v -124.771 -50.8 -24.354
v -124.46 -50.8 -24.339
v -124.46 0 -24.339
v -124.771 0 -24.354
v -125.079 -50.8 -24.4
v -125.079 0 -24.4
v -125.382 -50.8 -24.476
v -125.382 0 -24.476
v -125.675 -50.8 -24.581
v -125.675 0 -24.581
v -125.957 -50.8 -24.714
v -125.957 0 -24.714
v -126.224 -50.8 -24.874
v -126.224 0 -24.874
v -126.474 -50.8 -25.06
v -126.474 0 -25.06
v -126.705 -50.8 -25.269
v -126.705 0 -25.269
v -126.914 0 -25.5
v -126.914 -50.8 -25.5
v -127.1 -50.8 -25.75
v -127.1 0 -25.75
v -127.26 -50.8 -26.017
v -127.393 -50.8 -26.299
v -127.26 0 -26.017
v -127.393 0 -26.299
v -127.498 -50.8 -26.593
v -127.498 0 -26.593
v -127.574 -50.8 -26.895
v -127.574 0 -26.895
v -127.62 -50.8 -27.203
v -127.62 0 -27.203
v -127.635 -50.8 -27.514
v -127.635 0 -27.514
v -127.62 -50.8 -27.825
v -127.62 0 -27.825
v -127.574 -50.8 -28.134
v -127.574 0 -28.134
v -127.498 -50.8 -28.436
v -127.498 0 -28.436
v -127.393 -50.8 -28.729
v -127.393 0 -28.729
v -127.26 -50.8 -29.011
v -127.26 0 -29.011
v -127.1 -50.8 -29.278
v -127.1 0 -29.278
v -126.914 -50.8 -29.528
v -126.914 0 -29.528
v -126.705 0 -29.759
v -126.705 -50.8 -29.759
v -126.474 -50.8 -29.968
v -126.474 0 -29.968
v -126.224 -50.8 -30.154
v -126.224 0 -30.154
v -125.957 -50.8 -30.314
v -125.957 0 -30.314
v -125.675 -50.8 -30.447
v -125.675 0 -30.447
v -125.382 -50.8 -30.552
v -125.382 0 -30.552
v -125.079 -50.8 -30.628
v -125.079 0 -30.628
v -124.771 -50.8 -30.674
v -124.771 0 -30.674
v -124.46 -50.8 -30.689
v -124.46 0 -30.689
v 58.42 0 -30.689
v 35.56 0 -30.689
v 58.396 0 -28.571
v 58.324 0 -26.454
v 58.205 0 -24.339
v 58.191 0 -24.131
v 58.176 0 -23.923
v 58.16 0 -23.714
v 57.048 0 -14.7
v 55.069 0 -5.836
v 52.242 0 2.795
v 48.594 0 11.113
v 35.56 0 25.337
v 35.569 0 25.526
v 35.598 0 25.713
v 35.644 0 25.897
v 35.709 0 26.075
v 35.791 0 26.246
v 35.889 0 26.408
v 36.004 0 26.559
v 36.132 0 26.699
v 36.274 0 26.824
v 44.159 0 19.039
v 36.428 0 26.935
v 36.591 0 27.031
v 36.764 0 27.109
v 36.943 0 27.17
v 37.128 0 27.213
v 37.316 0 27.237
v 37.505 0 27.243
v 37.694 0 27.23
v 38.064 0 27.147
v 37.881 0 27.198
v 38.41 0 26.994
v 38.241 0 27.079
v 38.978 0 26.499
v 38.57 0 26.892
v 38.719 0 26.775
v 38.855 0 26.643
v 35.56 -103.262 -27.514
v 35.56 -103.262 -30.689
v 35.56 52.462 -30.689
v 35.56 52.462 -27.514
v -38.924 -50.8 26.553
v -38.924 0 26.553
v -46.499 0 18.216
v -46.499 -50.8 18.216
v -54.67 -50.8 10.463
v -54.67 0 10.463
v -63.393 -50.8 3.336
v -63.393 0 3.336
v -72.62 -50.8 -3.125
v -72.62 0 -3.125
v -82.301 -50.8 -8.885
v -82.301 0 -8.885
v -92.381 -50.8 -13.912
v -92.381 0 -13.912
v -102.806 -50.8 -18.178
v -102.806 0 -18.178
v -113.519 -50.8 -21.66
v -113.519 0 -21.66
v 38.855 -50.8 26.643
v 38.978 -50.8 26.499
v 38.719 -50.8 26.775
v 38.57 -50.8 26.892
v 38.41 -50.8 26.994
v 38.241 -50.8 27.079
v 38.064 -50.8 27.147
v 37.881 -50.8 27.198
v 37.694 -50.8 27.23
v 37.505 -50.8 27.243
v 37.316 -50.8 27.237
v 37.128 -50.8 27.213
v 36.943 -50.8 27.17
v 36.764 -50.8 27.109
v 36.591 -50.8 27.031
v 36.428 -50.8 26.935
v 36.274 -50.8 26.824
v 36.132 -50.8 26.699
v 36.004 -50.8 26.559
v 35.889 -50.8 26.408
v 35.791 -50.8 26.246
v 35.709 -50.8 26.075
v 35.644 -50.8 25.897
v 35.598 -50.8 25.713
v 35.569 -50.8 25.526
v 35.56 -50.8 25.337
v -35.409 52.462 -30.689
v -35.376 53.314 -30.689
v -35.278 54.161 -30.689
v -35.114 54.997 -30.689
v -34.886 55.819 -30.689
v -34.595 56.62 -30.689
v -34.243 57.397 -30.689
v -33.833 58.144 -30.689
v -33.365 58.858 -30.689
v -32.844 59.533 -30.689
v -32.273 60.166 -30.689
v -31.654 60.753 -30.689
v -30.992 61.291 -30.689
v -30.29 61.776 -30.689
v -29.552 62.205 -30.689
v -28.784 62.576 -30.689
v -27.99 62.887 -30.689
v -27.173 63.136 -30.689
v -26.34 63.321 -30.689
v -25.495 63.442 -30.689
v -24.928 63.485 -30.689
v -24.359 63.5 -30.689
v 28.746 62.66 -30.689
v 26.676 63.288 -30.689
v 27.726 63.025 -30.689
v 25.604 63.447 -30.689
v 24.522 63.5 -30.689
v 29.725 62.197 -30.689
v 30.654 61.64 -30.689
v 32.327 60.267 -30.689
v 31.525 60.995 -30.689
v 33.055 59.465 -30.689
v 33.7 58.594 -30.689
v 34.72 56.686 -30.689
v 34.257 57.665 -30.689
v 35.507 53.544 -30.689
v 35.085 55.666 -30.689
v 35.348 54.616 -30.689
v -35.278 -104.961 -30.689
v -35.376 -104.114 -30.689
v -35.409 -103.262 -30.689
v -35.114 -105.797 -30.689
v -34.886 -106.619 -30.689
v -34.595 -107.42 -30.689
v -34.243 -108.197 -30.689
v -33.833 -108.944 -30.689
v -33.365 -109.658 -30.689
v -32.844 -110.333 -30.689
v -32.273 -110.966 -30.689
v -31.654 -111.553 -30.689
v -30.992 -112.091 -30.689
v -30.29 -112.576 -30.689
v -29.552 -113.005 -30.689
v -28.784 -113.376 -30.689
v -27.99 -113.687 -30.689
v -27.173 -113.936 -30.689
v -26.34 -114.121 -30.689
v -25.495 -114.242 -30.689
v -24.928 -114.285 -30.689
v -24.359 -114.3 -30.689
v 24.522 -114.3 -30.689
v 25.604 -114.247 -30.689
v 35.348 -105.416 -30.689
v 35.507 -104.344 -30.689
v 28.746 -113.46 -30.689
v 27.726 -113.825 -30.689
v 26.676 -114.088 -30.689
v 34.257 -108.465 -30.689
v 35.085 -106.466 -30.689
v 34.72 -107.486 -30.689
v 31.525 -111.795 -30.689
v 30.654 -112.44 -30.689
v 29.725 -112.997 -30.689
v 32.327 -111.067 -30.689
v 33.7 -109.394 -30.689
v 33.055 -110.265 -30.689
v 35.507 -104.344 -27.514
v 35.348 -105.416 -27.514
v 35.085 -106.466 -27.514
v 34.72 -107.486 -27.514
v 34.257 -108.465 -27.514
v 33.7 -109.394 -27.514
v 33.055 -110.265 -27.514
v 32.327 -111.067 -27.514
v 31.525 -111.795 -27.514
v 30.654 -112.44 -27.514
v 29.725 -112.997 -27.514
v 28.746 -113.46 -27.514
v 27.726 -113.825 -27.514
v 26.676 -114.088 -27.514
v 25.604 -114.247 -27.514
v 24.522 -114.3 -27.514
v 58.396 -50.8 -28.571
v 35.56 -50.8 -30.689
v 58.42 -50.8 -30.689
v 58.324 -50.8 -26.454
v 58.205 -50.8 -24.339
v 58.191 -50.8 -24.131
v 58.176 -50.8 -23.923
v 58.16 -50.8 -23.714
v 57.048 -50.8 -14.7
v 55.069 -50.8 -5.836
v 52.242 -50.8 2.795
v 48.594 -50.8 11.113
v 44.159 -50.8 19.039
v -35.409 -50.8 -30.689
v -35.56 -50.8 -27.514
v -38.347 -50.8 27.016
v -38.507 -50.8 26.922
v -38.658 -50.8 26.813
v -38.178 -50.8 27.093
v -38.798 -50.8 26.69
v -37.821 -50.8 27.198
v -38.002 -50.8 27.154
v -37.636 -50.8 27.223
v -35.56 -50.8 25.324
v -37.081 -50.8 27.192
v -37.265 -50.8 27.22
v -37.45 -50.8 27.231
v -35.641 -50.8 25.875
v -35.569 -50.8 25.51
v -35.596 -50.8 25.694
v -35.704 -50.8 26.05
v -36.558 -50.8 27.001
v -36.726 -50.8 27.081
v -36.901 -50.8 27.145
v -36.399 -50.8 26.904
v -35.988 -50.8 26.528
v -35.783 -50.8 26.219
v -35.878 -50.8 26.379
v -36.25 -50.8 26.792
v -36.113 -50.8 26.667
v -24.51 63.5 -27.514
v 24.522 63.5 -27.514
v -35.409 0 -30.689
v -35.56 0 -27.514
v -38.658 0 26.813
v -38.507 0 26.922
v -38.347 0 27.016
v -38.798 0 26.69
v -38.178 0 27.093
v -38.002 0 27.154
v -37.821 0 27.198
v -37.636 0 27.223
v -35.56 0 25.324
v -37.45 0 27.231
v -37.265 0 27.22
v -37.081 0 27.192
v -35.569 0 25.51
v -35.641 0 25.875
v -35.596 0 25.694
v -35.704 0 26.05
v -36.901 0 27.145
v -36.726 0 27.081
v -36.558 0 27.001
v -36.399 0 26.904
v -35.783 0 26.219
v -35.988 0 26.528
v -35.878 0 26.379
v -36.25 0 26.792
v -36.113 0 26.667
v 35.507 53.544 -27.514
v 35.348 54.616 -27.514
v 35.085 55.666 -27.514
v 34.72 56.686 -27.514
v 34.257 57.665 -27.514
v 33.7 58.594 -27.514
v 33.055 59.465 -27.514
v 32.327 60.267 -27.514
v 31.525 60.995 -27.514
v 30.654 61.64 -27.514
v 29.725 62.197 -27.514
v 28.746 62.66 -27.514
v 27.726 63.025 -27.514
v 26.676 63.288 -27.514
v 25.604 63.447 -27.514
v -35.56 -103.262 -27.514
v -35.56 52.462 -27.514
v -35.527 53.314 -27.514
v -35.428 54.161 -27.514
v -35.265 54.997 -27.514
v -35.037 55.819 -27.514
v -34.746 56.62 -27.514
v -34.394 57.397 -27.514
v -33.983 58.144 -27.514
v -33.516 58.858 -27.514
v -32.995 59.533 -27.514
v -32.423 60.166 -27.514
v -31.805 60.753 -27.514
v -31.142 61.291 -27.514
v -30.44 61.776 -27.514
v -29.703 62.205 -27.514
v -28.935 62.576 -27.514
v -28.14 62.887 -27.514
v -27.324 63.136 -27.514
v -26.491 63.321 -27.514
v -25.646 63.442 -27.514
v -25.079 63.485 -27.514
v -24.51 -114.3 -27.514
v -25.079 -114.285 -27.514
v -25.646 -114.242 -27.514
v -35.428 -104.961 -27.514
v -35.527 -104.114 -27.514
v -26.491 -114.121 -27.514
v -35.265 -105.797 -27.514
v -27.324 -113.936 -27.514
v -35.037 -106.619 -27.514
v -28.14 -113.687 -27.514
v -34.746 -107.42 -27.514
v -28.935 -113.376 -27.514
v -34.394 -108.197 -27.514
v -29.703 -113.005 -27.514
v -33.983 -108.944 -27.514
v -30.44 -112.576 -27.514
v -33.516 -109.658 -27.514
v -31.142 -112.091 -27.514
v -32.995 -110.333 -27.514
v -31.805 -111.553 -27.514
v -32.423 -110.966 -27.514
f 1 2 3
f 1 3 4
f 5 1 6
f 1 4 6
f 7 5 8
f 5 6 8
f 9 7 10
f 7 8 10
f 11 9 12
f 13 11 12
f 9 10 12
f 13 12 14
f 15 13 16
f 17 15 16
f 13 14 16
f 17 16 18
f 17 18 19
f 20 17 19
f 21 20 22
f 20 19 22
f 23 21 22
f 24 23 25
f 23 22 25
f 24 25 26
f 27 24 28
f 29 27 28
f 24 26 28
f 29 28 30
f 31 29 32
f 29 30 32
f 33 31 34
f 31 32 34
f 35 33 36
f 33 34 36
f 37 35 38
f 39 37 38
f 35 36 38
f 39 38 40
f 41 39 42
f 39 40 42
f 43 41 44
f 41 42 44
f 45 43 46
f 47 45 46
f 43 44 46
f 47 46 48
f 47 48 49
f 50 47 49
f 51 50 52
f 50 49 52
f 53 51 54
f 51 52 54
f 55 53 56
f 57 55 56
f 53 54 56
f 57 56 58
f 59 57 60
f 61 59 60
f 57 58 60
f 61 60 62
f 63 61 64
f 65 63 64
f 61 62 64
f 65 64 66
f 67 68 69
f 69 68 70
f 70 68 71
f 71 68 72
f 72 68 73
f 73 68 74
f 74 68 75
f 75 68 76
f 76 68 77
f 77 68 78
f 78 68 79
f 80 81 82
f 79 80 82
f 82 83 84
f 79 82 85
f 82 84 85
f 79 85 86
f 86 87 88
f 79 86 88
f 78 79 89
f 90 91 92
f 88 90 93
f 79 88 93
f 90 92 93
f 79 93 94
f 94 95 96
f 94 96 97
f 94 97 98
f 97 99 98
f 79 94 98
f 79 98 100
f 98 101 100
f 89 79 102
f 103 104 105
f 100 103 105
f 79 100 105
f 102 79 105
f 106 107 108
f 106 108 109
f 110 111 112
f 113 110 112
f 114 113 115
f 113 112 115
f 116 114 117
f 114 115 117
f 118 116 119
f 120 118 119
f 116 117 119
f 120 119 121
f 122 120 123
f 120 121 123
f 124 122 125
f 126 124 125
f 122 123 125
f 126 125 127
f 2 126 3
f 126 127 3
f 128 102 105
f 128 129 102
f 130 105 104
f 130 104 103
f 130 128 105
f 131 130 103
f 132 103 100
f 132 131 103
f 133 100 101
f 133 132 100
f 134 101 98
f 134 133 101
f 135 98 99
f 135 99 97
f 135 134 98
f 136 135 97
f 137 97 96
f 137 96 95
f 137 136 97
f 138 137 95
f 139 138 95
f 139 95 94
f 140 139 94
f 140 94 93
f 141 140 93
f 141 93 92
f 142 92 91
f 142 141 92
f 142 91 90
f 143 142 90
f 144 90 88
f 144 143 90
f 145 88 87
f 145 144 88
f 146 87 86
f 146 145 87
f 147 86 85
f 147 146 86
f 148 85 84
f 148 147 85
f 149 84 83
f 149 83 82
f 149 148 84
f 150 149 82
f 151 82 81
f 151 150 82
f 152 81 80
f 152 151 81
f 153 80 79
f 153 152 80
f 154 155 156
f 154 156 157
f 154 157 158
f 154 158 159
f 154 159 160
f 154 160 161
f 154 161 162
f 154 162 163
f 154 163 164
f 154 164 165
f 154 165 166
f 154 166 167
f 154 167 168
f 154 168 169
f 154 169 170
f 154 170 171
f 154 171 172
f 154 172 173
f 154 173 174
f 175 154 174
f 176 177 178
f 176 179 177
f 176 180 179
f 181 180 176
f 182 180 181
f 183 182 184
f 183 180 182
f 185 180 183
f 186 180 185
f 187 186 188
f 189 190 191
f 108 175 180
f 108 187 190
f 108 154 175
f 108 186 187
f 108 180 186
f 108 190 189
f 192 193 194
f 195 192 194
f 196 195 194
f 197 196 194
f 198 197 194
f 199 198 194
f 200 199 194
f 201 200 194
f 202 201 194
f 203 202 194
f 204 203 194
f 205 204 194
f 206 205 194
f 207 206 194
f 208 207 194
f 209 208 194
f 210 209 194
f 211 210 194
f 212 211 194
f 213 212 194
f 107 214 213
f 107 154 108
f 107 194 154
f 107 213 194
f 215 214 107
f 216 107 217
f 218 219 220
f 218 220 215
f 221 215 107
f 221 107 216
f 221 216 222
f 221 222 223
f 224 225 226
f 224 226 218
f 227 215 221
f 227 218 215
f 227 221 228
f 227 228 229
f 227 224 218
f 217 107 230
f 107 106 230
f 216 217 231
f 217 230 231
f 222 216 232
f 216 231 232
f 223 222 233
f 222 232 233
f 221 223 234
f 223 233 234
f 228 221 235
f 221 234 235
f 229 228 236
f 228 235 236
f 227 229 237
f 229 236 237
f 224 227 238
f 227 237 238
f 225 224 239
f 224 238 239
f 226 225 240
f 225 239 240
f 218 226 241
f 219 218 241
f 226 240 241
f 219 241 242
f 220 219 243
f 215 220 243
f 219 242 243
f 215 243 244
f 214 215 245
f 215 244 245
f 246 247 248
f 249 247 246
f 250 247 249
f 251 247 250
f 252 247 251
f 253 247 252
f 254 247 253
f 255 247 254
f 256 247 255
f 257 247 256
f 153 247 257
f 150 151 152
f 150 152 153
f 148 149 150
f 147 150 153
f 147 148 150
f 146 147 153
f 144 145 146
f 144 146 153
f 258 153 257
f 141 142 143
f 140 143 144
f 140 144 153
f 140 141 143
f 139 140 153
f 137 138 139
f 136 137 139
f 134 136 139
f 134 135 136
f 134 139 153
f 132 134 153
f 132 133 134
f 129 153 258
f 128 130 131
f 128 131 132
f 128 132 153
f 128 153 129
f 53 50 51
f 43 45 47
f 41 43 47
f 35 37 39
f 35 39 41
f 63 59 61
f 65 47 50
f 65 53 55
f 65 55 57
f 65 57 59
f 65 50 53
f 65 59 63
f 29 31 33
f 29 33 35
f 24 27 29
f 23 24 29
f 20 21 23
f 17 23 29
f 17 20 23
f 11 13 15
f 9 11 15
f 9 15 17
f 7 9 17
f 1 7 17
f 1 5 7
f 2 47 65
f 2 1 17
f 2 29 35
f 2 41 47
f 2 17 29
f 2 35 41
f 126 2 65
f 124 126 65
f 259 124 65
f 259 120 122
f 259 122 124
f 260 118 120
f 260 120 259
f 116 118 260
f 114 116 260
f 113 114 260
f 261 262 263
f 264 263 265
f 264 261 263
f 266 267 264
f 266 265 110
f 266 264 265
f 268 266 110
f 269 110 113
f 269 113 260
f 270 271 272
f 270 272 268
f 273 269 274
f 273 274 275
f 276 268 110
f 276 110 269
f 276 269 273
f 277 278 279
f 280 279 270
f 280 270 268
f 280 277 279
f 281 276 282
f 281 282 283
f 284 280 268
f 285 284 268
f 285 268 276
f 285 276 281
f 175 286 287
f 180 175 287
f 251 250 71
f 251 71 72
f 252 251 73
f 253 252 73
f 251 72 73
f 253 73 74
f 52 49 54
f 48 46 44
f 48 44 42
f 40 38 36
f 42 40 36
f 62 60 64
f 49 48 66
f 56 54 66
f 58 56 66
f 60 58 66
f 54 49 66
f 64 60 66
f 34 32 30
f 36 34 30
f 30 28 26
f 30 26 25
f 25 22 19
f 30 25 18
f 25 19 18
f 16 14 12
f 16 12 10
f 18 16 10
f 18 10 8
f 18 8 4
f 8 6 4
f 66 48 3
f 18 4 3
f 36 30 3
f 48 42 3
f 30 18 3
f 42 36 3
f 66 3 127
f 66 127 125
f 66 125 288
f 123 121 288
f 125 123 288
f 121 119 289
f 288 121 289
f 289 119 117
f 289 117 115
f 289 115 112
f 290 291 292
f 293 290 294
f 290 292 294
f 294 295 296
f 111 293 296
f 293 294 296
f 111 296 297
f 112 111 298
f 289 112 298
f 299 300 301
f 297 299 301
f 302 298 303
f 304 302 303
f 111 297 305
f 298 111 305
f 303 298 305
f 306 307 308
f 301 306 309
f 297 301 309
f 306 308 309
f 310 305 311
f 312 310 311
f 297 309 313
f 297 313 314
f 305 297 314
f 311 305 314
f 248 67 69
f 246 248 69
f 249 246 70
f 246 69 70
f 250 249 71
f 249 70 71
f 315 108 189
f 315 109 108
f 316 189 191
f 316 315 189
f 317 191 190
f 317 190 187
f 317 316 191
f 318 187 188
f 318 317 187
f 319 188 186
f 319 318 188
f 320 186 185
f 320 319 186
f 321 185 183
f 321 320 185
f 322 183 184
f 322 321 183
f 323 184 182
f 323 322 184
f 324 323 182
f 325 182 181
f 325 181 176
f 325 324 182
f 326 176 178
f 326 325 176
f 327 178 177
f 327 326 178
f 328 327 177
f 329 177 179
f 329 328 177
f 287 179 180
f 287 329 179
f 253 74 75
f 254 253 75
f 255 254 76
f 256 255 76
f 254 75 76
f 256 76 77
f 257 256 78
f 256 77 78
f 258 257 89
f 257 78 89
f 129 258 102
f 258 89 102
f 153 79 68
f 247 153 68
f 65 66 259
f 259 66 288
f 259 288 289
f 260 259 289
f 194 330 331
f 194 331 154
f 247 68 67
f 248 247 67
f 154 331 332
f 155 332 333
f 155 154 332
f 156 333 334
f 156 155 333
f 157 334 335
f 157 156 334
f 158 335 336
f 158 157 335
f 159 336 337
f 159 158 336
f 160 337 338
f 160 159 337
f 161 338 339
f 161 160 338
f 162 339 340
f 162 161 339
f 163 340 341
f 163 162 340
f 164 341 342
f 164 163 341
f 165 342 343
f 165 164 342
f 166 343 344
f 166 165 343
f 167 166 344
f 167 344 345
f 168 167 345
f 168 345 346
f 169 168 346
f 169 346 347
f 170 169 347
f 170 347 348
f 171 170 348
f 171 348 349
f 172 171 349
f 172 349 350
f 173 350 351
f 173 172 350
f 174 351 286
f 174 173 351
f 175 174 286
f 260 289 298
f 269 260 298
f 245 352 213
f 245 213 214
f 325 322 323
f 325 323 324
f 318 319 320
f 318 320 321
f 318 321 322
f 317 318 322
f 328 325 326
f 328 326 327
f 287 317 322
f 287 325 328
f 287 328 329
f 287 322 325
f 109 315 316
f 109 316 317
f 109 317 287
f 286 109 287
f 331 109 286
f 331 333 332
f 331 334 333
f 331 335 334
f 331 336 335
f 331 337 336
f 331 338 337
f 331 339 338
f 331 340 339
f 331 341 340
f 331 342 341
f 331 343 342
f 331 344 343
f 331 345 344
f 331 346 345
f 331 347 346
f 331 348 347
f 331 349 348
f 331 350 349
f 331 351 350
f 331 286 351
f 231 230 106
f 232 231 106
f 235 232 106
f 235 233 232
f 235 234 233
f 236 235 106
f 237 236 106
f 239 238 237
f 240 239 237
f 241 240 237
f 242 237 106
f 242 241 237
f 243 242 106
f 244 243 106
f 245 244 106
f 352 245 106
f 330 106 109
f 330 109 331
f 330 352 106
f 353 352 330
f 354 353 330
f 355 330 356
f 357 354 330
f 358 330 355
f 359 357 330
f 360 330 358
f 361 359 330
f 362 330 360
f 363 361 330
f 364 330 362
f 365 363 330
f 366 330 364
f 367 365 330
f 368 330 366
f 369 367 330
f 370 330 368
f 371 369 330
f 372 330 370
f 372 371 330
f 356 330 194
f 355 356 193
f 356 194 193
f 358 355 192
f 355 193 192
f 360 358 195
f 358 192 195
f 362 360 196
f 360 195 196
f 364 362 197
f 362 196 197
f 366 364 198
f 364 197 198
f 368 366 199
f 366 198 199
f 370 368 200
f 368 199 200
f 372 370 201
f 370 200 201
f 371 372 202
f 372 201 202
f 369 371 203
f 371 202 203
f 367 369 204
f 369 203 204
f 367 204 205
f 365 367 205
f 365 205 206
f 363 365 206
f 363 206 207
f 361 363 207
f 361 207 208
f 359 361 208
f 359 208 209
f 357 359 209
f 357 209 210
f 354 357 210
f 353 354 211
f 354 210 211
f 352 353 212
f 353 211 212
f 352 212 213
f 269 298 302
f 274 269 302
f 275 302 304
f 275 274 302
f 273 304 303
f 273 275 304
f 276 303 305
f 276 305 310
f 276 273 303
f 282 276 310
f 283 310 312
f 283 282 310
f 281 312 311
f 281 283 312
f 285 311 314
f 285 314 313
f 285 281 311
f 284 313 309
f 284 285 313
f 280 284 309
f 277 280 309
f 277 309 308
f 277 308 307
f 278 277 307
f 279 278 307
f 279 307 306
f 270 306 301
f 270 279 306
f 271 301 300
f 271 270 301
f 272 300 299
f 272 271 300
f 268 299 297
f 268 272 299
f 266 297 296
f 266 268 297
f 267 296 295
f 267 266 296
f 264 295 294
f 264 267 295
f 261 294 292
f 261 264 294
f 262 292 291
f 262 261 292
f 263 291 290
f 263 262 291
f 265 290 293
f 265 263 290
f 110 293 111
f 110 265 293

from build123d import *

# Parameters (mm, degrees)
F1_DEPTH = 50.8
F2_DEPTH = 114.3
F3_DEPTH = 63.5
F4_R     = 1.9065558253
F4_2_R   = 1.9065558253
F5_R     = 11.0377844072


with BuildPart() as f1:
    # F0 (on Front) → F1 (new body)
    with BuildSketch(Plane.XZ):
        with BuildLine():
            ThreePointArc((-124.4600042701, -24.3391744789), (-127.6350042701, -27.5141744789), (-124.4600042701, -30.6891744789))
            Line((-124.4600042701, -30.6891744789), (-124.4600042701, -24.3391744789))
        make_face()
        with BuildLine():
            Line((-124.4600042701, -30.6891744789), (-35.409415784, -30.6891744789))
            Line((-35.409415784, -30.6891744789), (-35.5600006878, -27.5141744789))
            Line((-35.5600006878, -27.5141744789), (-35.5600006878, -24.3391744789))
            Line((-35.5600006878, -24.3391744789), (-35.5600006878, 30.6891744789))
            ThreePointArc((-35.5600006878, 30.6891744789), (-75.1282903874, -4.7115572136), (-124.4600042701, -24.3391744789))
            Line((-124.4600042701, -24.3391744789), (-124.4600042701, -30.6891744789))
        make_face()
    extrude(amount=F1_DEPTH)

    # F4
    f4_edges = [f1.edges().sort_by_distance(p)[0] for p in [
        (-35.560001, -25.4, 30.689174),
    ]]
    fillet(f4_edges, radius=F4_R)


with BuildPart() as f1b:
    # F0 (on Front) → F1, piece 2 (new body)
    with BuildSketch(Plane.XZ):
        with BuildLine():
            Line((35.5599969625, -27.5141744789), (35.5599969625, -30.6891744789))
            Line((35.5599969625, -30.6891744789), (58.42, -30.6891744789))
            ThreePointArc((58.42, -30.6891744789), (58.3662051014, -27.5123531227), (58.2048820896, -24.3391744789))
            ThreePointArc((58.2048820896, -24.3391744789), (58.1831610583, -24.0266804729), (58.1603968933, -23.7142607236))
            ThreePointArc((58.1603968933, -23.7142607236), (51.2405848867, 5.3071676983), (35.5599969625, 30.6891744789))
            Line((35.5599969625, 30.6891744789), (35.5599969625, -24.3391744789))
            Line((35.5599969625, -24.3391744789), (35.5599969625, -27.5141744789))
        make_face()
    extrude(amount=F1_DEPTH)

    # F4#2
    f4_2_edges = [f1b.edges().sort_by_distance(p)[0] for p in [
        (35.559997, -25.4, 30.689174),
    ]]
    fillet(f4_2_edges, radius=F4_2_R)


with BuildPart() as f2:
    # F0 (on Front) → F2 (new body)
    with BuildSketch(Plane.XZ):
        Polygon((-33.02, -30.6891744789), (33.02, -30.6891744789), (35.5599969625, -30.6891744789), (35.5599969625, -27.5141744789), (-35.5600006878, -27.5141744789), (-35.409415784, -30.6891744789), align=None)
    extrude(amount=F2_DEPTH)

    # F0 (on Front) → F3 (join)
    with BuildSketch(Plane.XZ):
        Polygon((-33.02, -30.6891744789), (33.02, -30.6891744789), (35.5599969625, -30.6891744789), (35.5599969625, -27.5141744789), (-35.5600006878, -27.5141744789), (-35.409415784, -30.6891744789), align=None)
    extrude(amount=-F3_DEPTH)

    # F5
    f5_edges = [f2.edges().sort_by_distance(p)[0] for p in [
        (-35.484708, -114.3, -29.101674),
        (35.559997, -114.3, -29.101674),
        (35.559997, 63.5, -29.101674),
        (-35.484708, 63.5, -29.101674),
    ]]
    fillet(f5_edges, radius=F5_R)


solid = Compound([f1.part, f1b.part, f2.part])
